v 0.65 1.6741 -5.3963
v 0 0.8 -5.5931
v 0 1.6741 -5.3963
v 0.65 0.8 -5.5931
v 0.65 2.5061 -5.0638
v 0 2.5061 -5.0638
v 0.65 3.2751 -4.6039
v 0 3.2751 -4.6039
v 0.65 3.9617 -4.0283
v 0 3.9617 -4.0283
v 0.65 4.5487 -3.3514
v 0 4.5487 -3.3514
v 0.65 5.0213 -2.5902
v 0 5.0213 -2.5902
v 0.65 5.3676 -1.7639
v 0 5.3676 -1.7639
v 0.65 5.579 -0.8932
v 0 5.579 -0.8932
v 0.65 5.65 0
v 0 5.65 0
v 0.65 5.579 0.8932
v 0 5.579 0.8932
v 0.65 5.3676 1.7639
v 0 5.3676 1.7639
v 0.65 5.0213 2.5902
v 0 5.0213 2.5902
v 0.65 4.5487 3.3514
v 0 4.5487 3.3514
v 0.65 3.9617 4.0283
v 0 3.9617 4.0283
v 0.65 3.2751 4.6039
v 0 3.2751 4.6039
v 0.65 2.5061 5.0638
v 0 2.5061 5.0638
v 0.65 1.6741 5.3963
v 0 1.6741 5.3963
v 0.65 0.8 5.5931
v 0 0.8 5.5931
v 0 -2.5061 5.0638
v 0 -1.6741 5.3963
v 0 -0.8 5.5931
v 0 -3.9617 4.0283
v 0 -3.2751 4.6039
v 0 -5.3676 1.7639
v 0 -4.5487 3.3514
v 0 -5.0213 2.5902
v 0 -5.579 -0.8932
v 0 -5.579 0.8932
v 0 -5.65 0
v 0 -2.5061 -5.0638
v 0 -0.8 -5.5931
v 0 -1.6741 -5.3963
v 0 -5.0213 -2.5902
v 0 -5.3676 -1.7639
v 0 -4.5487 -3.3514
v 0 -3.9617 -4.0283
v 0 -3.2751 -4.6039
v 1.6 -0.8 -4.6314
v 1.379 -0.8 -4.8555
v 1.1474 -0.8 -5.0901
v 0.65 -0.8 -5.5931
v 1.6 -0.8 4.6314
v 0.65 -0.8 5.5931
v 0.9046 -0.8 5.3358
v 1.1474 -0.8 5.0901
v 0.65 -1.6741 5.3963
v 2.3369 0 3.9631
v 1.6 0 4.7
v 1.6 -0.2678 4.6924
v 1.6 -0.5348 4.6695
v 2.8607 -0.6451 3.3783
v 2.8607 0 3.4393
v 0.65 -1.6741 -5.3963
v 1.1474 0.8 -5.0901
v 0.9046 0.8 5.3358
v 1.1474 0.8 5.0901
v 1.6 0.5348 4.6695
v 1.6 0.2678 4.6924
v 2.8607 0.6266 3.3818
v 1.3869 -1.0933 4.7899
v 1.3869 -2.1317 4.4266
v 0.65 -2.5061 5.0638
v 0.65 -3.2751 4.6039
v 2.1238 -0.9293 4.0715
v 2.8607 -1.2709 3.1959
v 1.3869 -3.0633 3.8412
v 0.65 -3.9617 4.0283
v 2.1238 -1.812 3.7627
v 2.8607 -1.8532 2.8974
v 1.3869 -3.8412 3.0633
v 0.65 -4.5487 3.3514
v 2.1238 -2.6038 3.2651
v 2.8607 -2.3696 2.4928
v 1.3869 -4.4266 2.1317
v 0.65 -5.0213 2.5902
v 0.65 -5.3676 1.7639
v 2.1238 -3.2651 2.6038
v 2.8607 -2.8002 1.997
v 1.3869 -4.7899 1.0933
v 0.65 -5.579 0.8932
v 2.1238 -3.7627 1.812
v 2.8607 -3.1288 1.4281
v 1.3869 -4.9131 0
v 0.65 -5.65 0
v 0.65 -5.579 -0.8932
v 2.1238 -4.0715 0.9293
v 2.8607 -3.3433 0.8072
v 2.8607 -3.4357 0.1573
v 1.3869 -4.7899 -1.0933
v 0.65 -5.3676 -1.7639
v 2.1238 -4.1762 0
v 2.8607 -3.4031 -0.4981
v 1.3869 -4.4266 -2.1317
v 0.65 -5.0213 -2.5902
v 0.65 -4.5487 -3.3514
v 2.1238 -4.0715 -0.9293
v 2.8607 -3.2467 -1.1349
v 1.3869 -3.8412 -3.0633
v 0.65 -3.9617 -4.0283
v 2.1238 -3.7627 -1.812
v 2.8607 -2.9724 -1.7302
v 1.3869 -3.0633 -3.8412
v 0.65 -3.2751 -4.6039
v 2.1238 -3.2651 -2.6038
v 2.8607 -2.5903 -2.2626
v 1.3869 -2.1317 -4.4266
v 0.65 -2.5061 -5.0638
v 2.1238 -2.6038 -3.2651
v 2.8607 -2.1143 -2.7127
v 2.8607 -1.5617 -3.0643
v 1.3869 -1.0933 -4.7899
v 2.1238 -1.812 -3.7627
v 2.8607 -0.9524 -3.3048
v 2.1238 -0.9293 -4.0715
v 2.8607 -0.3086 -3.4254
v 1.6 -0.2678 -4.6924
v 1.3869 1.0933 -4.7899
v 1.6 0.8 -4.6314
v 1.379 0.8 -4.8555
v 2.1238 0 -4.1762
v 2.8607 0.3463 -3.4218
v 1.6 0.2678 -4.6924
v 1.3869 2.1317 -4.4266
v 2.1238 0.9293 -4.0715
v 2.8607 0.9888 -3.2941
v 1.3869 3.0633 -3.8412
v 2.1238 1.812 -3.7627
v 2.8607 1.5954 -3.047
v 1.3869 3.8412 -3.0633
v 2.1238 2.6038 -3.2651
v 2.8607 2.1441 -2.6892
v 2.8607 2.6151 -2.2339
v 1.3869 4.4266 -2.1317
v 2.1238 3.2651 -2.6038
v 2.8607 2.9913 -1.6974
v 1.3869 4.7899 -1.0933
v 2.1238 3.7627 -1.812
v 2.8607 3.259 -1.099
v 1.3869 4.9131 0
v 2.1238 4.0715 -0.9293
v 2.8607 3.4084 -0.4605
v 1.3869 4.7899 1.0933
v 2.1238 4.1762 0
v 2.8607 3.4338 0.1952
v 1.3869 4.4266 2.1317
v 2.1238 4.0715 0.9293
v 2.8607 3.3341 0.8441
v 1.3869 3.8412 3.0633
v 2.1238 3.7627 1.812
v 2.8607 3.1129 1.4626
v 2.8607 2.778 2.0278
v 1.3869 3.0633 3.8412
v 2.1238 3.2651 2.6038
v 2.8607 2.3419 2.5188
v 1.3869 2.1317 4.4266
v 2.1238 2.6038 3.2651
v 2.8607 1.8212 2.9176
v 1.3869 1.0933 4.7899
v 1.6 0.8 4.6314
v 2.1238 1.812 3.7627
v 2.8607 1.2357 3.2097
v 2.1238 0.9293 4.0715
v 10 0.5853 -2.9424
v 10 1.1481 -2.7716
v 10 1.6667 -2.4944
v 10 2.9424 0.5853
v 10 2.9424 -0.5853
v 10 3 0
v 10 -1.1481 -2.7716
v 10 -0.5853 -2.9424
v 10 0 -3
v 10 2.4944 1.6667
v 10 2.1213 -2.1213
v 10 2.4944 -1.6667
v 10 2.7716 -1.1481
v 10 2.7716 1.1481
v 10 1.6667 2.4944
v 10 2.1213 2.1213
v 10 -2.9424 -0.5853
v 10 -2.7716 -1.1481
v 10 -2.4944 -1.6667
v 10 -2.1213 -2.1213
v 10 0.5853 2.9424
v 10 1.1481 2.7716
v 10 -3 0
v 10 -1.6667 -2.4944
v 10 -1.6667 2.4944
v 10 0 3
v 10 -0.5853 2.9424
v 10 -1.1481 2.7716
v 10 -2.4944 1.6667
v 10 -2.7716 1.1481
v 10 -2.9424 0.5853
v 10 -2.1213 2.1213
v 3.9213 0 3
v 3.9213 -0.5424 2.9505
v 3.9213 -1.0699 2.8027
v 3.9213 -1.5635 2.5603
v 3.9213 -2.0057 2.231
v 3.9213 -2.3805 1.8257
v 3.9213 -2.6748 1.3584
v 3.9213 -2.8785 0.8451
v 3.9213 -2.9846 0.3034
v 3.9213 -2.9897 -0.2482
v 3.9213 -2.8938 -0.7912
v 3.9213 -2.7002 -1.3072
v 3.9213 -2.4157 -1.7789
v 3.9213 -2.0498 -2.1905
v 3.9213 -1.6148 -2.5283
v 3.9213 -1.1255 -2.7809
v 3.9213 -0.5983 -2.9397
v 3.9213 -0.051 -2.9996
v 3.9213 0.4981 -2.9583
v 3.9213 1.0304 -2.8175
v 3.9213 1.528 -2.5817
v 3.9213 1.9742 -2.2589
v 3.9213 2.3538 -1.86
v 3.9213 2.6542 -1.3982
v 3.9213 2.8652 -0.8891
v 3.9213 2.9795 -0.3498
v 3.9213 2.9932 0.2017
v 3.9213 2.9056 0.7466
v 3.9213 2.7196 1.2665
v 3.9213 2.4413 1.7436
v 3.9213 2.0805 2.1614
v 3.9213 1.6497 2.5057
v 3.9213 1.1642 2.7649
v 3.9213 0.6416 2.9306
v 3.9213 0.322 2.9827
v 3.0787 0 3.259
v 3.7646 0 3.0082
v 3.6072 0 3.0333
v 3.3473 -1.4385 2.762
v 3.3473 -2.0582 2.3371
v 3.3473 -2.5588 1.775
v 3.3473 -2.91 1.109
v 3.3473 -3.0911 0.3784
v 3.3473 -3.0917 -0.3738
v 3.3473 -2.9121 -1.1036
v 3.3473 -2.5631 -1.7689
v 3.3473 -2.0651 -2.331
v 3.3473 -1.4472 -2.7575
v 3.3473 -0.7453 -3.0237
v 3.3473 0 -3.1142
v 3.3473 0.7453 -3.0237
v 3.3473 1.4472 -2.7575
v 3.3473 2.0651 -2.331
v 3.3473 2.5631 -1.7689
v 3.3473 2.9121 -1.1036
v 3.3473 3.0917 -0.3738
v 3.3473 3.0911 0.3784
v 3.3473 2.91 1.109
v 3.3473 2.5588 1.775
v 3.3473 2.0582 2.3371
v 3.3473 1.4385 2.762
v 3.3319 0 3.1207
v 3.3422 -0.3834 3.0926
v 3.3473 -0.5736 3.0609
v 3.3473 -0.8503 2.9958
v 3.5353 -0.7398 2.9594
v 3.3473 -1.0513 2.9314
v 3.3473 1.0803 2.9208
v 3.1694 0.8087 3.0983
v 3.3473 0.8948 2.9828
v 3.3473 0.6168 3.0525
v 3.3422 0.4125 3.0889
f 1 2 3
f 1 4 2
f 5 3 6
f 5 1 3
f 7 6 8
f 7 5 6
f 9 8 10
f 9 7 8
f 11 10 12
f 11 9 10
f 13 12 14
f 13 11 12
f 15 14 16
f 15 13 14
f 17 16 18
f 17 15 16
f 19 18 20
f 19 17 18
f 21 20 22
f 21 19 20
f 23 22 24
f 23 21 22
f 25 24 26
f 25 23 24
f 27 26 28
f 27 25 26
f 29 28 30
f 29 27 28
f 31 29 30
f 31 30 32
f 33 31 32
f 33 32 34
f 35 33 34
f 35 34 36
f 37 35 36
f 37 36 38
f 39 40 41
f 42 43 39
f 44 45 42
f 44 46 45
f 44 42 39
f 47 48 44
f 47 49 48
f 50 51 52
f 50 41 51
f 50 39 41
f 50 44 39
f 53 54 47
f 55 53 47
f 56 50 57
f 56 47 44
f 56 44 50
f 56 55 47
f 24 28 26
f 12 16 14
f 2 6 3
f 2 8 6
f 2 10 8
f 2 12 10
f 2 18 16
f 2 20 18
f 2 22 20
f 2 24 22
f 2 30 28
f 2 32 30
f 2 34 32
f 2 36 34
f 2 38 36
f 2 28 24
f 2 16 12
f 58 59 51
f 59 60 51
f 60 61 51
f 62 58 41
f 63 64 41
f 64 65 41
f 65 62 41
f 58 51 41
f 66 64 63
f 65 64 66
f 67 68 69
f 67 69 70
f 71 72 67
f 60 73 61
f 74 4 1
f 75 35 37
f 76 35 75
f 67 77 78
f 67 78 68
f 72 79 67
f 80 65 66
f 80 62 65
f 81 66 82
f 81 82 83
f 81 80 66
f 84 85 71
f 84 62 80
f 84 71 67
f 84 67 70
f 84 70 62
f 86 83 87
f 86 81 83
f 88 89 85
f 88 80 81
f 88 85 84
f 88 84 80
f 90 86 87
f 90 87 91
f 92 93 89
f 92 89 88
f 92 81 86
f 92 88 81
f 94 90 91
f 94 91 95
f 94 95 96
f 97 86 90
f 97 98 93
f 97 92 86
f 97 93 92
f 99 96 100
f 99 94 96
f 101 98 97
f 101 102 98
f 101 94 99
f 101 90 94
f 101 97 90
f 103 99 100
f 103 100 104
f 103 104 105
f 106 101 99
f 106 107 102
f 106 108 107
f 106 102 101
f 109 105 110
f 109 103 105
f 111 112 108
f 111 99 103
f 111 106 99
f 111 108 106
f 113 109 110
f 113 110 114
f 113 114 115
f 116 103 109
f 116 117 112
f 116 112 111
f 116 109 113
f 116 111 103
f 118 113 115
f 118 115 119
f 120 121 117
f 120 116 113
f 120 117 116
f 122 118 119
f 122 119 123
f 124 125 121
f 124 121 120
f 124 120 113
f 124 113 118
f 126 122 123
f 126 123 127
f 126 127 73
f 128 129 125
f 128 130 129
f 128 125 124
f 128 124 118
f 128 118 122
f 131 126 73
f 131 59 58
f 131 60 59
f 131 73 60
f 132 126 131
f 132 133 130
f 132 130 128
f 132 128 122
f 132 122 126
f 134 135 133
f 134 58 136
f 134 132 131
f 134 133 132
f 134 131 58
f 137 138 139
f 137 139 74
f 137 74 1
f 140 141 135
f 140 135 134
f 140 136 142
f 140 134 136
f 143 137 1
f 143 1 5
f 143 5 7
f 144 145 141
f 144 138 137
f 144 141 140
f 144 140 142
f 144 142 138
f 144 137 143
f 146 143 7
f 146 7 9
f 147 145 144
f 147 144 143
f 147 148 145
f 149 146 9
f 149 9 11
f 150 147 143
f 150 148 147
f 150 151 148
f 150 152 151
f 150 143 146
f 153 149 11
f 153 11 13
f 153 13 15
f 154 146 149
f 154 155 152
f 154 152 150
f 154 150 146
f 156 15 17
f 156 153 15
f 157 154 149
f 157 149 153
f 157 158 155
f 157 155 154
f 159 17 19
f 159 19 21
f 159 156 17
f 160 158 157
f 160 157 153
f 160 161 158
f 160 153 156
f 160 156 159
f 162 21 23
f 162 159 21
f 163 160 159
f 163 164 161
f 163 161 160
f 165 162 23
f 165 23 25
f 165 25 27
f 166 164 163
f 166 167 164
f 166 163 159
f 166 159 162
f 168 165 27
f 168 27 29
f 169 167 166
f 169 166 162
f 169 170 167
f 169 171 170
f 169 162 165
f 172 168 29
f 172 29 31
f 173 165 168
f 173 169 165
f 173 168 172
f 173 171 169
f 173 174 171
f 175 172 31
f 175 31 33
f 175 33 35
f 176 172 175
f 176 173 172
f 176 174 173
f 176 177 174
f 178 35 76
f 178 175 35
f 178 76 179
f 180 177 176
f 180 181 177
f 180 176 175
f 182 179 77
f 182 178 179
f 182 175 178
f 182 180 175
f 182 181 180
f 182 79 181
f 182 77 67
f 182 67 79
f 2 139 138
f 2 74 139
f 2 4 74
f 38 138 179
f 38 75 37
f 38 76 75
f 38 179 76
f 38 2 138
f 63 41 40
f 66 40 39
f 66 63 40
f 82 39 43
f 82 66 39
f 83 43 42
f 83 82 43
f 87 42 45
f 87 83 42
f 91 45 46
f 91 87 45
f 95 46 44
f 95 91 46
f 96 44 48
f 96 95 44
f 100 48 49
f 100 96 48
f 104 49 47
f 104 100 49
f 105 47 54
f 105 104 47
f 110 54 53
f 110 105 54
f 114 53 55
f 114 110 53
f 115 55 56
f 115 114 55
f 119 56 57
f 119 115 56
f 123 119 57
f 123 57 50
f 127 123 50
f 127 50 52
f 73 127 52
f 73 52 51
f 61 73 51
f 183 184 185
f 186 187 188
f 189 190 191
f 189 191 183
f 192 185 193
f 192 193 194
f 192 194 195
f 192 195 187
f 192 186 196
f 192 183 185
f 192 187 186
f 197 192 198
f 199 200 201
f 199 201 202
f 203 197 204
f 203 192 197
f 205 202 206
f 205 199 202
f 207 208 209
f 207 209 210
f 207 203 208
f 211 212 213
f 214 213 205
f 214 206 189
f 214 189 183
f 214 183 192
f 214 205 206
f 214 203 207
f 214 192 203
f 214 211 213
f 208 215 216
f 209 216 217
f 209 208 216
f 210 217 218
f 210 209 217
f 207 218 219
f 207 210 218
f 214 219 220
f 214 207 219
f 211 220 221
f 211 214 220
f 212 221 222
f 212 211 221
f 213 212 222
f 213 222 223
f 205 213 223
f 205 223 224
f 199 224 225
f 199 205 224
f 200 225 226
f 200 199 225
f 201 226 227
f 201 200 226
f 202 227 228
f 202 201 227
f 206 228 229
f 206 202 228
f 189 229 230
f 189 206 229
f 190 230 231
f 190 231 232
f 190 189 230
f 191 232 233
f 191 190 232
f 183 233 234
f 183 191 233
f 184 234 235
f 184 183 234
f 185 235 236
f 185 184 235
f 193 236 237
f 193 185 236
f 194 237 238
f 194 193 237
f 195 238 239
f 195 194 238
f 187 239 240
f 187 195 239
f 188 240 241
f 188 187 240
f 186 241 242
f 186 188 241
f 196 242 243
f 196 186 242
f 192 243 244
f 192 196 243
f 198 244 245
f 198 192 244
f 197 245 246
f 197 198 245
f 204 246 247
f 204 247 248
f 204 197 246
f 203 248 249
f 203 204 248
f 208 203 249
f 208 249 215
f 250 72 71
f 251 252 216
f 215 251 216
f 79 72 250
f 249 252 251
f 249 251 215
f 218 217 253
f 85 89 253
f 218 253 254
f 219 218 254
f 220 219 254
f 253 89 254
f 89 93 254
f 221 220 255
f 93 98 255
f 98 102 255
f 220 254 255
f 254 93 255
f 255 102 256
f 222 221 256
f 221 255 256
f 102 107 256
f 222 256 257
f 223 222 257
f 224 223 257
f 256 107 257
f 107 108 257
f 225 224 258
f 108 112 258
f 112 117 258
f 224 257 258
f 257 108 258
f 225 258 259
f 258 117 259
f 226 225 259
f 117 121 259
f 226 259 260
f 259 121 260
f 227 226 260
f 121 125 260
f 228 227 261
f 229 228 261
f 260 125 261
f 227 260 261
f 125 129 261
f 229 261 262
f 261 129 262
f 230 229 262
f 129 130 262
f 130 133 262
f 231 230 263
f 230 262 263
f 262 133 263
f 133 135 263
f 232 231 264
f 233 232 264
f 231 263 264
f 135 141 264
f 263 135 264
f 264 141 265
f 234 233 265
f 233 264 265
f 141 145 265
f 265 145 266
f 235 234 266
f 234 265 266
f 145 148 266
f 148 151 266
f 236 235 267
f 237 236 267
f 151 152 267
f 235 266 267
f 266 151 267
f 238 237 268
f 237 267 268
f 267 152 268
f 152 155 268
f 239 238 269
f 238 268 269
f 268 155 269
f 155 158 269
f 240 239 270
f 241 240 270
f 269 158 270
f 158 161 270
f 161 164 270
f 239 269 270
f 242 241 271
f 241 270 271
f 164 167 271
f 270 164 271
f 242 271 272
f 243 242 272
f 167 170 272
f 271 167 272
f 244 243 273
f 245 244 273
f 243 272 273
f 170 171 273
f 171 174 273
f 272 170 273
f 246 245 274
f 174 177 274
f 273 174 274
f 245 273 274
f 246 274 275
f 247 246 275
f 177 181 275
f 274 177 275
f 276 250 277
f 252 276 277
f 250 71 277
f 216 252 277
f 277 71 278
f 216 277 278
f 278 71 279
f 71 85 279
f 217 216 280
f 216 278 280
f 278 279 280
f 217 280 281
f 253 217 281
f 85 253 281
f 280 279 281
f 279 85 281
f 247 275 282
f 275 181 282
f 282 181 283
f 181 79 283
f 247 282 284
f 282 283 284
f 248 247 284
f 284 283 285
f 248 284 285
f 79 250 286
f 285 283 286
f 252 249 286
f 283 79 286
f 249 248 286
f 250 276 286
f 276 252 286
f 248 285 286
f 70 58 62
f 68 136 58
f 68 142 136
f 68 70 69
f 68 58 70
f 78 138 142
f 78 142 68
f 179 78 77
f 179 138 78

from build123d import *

# Parameters (mm, degrees)
FILLET1_R  = 1.5
SKETCH2_W  = 11.3
SKETCH2_H  = 1.6
SLOT_DEPTH = 1.6


with BuildPart() as part:
    # BodySke → Base-Revolve (revolve)
    with BuildSketch(Plane.XY, mode=Mode.PRIVATE) as base_revolve_sk:
        Polygon((0, 0), (0, 5.65), (0.65, 5.65), (3.3, 3), (10, 3), (10, 0), align=None)
    revolve(base_revolve_sk.sketch.rotate(Axis((-6.35, 0, 0), (1, 0, 0)), 90), axis=Axis((-6.35, 0, 0), (1, 0, 0)))  # turned: the seam where the file's is

    # Fillet1
    fillet1_edges = [part.edges().sort_by_distance(p)[0] for p in [
        (3.3, 0, -3),
    ]]
    fillet(fillet1_edges, radius=FILLET1_R)

    # Sketch2 → Slot (cut)
    with BuildSketch(Plane.ZY):
        Rectangle(SKETCH2_W, SKETCH2_H)
    extrude(amount=-SLOT_DEPTH, mode=Mode.SUBTRACT)


solid = part.part
